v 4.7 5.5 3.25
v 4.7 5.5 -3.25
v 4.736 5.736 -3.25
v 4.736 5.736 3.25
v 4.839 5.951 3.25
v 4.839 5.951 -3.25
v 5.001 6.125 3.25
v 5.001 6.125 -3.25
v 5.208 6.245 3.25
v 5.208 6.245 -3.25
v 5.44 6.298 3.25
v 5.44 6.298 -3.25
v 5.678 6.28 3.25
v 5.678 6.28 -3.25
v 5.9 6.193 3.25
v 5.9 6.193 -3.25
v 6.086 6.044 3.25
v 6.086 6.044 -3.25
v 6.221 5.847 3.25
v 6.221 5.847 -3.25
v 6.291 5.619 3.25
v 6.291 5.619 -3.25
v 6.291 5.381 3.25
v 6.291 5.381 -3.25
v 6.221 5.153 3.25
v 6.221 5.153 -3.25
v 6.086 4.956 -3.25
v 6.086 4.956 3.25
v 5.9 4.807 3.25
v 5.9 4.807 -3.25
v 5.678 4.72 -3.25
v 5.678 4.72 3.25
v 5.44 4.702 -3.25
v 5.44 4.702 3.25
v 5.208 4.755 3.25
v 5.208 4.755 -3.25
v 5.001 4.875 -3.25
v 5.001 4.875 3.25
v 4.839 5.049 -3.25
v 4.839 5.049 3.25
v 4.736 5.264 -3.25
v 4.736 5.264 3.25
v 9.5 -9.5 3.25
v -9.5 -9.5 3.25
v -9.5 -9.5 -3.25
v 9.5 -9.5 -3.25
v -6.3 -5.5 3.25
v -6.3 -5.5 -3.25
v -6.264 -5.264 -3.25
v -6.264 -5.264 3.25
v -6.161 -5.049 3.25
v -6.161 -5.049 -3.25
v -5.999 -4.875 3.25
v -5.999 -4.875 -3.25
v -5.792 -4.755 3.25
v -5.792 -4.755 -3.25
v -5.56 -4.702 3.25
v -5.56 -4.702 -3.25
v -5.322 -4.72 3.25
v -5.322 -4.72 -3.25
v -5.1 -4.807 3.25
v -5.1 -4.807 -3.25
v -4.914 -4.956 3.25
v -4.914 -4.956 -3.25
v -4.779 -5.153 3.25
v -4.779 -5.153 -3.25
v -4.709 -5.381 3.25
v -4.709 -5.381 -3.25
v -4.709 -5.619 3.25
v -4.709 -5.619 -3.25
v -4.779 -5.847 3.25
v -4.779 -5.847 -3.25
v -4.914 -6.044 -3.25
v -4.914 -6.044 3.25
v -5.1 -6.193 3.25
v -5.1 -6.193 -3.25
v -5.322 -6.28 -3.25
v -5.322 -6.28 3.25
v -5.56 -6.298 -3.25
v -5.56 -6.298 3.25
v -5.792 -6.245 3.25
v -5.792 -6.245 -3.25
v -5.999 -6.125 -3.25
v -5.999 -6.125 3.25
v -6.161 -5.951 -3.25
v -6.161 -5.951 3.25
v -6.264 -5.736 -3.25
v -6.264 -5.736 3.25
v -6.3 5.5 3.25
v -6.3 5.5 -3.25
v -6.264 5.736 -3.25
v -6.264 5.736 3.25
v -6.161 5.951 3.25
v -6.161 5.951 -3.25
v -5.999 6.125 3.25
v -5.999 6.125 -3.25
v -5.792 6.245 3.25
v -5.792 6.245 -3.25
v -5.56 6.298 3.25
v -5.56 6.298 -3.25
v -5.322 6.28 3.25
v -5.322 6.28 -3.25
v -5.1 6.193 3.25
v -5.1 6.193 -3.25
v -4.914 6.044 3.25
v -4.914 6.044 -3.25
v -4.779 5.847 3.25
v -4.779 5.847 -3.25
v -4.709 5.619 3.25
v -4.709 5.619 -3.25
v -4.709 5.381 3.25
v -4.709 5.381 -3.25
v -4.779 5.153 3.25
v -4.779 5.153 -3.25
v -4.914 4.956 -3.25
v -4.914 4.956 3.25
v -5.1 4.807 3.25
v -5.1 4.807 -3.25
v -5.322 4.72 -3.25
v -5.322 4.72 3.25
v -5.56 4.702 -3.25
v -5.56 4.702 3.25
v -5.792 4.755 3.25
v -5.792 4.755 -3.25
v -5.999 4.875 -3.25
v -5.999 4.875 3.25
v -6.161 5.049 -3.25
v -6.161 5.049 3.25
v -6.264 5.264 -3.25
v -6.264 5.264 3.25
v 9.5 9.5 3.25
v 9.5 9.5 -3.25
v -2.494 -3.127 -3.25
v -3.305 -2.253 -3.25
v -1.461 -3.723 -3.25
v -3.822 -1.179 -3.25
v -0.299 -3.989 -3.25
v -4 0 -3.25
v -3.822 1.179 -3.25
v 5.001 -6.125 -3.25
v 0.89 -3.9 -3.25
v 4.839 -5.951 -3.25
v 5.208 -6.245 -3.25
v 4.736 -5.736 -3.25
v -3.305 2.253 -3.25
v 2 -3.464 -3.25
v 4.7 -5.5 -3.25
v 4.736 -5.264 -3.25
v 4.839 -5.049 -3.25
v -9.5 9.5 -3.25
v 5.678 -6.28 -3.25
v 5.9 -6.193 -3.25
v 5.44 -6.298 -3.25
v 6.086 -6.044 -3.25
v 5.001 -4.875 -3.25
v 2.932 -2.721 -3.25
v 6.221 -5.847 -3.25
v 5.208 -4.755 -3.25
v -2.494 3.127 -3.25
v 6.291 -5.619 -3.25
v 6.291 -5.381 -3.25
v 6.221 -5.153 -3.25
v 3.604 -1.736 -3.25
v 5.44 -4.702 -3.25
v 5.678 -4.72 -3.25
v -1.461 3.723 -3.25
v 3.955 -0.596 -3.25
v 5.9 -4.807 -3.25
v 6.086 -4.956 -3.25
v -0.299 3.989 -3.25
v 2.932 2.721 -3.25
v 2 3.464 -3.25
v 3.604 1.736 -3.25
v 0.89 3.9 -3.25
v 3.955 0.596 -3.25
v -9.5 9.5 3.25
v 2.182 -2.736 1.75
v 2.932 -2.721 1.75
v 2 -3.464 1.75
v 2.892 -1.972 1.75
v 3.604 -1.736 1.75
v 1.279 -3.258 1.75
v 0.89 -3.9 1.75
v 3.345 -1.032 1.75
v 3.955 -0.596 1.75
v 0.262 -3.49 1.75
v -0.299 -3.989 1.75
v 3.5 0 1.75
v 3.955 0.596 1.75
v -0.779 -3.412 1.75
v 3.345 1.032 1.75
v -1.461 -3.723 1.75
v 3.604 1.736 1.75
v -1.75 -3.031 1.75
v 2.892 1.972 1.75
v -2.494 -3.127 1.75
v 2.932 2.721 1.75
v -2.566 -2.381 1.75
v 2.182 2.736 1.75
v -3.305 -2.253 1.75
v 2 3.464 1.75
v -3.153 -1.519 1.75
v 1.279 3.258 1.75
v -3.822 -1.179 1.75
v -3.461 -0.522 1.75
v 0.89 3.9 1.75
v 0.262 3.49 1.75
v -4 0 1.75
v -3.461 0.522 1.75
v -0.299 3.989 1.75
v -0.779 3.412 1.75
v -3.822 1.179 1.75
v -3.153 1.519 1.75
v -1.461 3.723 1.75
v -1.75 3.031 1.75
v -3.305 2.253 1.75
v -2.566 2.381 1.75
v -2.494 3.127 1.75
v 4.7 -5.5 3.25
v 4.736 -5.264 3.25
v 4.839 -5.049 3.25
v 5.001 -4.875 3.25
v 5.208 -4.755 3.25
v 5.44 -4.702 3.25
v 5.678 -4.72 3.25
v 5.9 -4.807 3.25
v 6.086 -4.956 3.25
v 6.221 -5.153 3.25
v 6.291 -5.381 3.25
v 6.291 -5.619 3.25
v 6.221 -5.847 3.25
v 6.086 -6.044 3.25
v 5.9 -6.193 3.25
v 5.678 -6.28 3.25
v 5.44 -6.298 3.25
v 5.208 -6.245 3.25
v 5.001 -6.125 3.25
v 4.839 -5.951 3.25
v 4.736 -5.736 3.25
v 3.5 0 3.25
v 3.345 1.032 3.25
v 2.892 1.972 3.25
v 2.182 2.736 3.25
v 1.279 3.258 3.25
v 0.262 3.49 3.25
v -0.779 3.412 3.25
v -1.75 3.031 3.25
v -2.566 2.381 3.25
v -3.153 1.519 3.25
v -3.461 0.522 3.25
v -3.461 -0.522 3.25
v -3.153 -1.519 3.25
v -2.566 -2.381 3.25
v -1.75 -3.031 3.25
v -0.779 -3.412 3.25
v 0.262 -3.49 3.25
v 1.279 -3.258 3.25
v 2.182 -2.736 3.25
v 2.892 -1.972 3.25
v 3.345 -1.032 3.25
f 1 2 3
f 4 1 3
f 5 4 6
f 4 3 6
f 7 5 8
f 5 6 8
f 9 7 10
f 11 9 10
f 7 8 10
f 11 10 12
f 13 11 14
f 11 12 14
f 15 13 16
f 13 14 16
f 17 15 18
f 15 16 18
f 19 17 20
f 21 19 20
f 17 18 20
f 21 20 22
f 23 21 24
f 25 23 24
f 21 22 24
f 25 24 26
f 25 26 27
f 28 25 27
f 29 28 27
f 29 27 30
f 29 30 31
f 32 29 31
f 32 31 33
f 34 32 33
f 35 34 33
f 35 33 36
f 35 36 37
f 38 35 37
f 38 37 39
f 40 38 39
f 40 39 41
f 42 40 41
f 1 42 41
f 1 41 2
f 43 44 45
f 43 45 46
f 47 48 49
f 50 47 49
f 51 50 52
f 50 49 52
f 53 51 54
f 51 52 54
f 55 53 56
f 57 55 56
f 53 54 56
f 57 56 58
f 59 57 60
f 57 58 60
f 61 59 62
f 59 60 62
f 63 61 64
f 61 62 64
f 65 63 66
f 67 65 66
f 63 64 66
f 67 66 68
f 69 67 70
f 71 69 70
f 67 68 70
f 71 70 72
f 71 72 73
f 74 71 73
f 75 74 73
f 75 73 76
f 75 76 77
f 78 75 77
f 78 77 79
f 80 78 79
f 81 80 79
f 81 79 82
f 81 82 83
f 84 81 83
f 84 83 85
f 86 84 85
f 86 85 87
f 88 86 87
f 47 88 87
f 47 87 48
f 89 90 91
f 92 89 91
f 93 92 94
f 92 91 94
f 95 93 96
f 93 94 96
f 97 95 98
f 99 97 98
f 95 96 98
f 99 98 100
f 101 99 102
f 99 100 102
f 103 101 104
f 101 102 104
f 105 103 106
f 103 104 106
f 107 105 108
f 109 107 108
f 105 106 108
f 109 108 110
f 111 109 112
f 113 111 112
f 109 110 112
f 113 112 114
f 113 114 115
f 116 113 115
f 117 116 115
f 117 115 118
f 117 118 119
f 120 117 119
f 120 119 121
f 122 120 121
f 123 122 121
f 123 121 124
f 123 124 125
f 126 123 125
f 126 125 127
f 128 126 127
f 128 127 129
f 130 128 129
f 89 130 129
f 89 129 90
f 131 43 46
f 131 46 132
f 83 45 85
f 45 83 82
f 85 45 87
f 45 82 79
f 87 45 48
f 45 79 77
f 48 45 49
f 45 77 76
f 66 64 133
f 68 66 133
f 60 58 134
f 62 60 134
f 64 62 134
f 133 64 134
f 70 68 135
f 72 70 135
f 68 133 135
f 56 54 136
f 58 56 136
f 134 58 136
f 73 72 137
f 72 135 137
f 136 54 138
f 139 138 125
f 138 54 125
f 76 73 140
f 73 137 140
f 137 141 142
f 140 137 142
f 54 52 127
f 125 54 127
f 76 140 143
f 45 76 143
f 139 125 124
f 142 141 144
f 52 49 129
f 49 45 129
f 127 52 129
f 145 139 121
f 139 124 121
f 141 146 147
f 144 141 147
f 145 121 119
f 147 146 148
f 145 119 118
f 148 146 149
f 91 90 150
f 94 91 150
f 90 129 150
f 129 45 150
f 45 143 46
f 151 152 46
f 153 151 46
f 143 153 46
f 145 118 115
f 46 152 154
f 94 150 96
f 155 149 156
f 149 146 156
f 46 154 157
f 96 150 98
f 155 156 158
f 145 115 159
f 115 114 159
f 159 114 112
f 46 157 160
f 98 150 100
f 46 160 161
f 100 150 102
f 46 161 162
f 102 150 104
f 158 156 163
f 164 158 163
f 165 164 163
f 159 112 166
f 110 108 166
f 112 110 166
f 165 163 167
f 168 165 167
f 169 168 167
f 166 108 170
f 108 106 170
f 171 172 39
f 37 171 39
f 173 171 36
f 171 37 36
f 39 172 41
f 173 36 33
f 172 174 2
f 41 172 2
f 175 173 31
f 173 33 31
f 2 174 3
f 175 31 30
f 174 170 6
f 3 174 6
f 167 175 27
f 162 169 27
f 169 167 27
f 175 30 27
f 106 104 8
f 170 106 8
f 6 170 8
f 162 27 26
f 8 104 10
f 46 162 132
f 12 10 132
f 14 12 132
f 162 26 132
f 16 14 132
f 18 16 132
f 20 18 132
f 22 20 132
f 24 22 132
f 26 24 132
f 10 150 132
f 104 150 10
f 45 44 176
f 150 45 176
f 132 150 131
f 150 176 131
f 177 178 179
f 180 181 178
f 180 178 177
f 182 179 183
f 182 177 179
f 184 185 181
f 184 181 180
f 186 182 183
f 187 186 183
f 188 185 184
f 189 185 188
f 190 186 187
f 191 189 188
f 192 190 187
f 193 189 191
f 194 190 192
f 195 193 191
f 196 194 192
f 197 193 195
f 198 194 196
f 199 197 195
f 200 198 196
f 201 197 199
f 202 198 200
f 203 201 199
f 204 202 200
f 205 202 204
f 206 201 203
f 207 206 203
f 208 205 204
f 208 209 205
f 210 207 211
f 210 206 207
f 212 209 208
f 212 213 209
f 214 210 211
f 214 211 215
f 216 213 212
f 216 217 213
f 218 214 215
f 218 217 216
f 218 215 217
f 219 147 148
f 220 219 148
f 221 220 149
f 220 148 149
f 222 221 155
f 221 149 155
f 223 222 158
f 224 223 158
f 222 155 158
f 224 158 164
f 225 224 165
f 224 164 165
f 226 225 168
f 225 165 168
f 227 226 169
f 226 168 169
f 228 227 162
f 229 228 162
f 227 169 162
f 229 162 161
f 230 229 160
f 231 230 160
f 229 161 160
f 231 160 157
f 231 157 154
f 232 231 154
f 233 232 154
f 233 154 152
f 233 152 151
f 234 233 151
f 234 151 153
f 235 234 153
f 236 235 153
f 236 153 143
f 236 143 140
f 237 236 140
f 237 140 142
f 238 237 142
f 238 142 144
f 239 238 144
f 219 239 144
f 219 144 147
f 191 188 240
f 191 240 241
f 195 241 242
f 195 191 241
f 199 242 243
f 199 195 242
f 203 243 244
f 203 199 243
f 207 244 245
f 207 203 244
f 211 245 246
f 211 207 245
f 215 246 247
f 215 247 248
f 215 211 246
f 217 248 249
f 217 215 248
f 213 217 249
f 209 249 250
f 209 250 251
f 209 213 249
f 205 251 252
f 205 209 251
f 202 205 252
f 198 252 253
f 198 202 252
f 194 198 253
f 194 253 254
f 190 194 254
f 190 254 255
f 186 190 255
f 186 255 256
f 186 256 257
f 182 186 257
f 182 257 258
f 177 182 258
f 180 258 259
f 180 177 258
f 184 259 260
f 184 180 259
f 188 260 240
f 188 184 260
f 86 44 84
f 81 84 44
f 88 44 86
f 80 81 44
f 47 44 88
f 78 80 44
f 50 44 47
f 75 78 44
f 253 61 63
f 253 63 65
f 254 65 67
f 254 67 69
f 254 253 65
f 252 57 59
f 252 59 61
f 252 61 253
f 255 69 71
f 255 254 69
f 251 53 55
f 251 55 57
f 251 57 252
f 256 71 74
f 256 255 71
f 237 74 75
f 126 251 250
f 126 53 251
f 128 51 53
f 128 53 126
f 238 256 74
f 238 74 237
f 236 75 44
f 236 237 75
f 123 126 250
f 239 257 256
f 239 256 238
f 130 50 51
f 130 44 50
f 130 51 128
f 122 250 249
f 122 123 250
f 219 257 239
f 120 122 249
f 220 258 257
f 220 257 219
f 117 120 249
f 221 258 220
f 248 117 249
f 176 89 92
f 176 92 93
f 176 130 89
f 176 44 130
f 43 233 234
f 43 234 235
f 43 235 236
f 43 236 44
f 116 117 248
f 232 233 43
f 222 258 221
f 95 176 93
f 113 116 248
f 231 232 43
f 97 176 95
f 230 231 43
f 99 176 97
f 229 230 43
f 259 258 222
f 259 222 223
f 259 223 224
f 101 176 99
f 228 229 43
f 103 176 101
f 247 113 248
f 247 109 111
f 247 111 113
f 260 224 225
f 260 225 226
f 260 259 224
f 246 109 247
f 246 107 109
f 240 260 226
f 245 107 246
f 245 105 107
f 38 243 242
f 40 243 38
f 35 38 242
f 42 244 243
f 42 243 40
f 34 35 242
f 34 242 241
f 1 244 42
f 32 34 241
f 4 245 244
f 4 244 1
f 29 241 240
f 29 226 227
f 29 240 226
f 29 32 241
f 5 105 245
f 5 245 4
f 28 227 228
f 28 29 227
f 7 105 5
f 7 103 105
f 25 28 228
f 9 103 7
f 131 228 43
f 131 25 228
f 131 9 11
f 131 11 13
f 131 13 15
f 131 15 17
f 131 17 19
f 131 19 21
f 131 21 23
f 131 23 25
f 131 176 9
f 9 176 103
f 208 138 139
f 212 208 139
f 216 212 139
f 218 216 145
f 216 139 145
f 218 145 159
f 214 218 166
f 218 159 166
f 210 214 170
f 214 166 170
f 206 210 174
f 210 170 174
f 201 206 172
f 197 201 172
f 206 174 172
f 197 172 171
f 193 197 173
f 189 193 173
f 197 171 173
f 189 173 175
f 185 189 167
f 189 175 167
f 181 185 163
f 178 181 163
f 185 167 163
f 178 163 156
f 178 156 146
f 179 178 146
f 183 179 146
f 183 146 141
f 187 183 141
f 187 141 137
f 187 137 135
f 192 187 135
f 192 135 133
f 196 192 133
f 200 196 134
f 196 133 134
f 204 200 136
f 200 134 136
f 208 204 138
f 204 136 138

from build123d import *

# Parameters (mm, degrees)
SKETCH1_W                   = 19
SKETCH1_H                   = 19
SKETCH1_R                   = 3.5
BOSS_EXTRUDE1_DEPTH         = 3.25
TAP_DRILL_FOR_M2_TAP1_D     = 1.6
TAP_DRILL_FOR_M2_TAP1_DEPTH = 11.5
SKETCH4_R                   = 4
CUT_EXTRUDE1_DEPTH          = 5


with BuildPart() as part:
    # Sketch1 → Boss-Extrude1 (new body, symmetric)
    with BuildSketch(Plane.XY):
        Rectangle(SKETCH1_W, SKETCH1_H)
        Circle(SKETCH1_R, mode=Mode.SUBTRACT)
    extrude(amount=BOSS_EXTRUDE1_DEPTH, both=True)

    # Tap Drill for M2 Tap1
    with Locations(Plane.XY.offset(3.25)):
        with Locations((-5.5, 5.5), (-5.5, -5.5), (5.5, 5.5), (5.5, -5.5)):
            Hole(TAP_DRILL_FOR_M2_TAP1_D / 2, depth=TAP_DRILL_FOR_M2_TAP1_DEPTH)

    # Sketch4 → Cut-Extrude1 (cut)
    with BuildSketch(Plane(origin=(0, 0, -3.25), x_dir=(-1, 0, 0), z_dir=(0, 0, -1))):
        Circle(SKETCH4_R)
    extrude(amount=-CUT_EXTRUDE1_DEPTH, mode=Mode.SUBTRACT)


solid = part.part
